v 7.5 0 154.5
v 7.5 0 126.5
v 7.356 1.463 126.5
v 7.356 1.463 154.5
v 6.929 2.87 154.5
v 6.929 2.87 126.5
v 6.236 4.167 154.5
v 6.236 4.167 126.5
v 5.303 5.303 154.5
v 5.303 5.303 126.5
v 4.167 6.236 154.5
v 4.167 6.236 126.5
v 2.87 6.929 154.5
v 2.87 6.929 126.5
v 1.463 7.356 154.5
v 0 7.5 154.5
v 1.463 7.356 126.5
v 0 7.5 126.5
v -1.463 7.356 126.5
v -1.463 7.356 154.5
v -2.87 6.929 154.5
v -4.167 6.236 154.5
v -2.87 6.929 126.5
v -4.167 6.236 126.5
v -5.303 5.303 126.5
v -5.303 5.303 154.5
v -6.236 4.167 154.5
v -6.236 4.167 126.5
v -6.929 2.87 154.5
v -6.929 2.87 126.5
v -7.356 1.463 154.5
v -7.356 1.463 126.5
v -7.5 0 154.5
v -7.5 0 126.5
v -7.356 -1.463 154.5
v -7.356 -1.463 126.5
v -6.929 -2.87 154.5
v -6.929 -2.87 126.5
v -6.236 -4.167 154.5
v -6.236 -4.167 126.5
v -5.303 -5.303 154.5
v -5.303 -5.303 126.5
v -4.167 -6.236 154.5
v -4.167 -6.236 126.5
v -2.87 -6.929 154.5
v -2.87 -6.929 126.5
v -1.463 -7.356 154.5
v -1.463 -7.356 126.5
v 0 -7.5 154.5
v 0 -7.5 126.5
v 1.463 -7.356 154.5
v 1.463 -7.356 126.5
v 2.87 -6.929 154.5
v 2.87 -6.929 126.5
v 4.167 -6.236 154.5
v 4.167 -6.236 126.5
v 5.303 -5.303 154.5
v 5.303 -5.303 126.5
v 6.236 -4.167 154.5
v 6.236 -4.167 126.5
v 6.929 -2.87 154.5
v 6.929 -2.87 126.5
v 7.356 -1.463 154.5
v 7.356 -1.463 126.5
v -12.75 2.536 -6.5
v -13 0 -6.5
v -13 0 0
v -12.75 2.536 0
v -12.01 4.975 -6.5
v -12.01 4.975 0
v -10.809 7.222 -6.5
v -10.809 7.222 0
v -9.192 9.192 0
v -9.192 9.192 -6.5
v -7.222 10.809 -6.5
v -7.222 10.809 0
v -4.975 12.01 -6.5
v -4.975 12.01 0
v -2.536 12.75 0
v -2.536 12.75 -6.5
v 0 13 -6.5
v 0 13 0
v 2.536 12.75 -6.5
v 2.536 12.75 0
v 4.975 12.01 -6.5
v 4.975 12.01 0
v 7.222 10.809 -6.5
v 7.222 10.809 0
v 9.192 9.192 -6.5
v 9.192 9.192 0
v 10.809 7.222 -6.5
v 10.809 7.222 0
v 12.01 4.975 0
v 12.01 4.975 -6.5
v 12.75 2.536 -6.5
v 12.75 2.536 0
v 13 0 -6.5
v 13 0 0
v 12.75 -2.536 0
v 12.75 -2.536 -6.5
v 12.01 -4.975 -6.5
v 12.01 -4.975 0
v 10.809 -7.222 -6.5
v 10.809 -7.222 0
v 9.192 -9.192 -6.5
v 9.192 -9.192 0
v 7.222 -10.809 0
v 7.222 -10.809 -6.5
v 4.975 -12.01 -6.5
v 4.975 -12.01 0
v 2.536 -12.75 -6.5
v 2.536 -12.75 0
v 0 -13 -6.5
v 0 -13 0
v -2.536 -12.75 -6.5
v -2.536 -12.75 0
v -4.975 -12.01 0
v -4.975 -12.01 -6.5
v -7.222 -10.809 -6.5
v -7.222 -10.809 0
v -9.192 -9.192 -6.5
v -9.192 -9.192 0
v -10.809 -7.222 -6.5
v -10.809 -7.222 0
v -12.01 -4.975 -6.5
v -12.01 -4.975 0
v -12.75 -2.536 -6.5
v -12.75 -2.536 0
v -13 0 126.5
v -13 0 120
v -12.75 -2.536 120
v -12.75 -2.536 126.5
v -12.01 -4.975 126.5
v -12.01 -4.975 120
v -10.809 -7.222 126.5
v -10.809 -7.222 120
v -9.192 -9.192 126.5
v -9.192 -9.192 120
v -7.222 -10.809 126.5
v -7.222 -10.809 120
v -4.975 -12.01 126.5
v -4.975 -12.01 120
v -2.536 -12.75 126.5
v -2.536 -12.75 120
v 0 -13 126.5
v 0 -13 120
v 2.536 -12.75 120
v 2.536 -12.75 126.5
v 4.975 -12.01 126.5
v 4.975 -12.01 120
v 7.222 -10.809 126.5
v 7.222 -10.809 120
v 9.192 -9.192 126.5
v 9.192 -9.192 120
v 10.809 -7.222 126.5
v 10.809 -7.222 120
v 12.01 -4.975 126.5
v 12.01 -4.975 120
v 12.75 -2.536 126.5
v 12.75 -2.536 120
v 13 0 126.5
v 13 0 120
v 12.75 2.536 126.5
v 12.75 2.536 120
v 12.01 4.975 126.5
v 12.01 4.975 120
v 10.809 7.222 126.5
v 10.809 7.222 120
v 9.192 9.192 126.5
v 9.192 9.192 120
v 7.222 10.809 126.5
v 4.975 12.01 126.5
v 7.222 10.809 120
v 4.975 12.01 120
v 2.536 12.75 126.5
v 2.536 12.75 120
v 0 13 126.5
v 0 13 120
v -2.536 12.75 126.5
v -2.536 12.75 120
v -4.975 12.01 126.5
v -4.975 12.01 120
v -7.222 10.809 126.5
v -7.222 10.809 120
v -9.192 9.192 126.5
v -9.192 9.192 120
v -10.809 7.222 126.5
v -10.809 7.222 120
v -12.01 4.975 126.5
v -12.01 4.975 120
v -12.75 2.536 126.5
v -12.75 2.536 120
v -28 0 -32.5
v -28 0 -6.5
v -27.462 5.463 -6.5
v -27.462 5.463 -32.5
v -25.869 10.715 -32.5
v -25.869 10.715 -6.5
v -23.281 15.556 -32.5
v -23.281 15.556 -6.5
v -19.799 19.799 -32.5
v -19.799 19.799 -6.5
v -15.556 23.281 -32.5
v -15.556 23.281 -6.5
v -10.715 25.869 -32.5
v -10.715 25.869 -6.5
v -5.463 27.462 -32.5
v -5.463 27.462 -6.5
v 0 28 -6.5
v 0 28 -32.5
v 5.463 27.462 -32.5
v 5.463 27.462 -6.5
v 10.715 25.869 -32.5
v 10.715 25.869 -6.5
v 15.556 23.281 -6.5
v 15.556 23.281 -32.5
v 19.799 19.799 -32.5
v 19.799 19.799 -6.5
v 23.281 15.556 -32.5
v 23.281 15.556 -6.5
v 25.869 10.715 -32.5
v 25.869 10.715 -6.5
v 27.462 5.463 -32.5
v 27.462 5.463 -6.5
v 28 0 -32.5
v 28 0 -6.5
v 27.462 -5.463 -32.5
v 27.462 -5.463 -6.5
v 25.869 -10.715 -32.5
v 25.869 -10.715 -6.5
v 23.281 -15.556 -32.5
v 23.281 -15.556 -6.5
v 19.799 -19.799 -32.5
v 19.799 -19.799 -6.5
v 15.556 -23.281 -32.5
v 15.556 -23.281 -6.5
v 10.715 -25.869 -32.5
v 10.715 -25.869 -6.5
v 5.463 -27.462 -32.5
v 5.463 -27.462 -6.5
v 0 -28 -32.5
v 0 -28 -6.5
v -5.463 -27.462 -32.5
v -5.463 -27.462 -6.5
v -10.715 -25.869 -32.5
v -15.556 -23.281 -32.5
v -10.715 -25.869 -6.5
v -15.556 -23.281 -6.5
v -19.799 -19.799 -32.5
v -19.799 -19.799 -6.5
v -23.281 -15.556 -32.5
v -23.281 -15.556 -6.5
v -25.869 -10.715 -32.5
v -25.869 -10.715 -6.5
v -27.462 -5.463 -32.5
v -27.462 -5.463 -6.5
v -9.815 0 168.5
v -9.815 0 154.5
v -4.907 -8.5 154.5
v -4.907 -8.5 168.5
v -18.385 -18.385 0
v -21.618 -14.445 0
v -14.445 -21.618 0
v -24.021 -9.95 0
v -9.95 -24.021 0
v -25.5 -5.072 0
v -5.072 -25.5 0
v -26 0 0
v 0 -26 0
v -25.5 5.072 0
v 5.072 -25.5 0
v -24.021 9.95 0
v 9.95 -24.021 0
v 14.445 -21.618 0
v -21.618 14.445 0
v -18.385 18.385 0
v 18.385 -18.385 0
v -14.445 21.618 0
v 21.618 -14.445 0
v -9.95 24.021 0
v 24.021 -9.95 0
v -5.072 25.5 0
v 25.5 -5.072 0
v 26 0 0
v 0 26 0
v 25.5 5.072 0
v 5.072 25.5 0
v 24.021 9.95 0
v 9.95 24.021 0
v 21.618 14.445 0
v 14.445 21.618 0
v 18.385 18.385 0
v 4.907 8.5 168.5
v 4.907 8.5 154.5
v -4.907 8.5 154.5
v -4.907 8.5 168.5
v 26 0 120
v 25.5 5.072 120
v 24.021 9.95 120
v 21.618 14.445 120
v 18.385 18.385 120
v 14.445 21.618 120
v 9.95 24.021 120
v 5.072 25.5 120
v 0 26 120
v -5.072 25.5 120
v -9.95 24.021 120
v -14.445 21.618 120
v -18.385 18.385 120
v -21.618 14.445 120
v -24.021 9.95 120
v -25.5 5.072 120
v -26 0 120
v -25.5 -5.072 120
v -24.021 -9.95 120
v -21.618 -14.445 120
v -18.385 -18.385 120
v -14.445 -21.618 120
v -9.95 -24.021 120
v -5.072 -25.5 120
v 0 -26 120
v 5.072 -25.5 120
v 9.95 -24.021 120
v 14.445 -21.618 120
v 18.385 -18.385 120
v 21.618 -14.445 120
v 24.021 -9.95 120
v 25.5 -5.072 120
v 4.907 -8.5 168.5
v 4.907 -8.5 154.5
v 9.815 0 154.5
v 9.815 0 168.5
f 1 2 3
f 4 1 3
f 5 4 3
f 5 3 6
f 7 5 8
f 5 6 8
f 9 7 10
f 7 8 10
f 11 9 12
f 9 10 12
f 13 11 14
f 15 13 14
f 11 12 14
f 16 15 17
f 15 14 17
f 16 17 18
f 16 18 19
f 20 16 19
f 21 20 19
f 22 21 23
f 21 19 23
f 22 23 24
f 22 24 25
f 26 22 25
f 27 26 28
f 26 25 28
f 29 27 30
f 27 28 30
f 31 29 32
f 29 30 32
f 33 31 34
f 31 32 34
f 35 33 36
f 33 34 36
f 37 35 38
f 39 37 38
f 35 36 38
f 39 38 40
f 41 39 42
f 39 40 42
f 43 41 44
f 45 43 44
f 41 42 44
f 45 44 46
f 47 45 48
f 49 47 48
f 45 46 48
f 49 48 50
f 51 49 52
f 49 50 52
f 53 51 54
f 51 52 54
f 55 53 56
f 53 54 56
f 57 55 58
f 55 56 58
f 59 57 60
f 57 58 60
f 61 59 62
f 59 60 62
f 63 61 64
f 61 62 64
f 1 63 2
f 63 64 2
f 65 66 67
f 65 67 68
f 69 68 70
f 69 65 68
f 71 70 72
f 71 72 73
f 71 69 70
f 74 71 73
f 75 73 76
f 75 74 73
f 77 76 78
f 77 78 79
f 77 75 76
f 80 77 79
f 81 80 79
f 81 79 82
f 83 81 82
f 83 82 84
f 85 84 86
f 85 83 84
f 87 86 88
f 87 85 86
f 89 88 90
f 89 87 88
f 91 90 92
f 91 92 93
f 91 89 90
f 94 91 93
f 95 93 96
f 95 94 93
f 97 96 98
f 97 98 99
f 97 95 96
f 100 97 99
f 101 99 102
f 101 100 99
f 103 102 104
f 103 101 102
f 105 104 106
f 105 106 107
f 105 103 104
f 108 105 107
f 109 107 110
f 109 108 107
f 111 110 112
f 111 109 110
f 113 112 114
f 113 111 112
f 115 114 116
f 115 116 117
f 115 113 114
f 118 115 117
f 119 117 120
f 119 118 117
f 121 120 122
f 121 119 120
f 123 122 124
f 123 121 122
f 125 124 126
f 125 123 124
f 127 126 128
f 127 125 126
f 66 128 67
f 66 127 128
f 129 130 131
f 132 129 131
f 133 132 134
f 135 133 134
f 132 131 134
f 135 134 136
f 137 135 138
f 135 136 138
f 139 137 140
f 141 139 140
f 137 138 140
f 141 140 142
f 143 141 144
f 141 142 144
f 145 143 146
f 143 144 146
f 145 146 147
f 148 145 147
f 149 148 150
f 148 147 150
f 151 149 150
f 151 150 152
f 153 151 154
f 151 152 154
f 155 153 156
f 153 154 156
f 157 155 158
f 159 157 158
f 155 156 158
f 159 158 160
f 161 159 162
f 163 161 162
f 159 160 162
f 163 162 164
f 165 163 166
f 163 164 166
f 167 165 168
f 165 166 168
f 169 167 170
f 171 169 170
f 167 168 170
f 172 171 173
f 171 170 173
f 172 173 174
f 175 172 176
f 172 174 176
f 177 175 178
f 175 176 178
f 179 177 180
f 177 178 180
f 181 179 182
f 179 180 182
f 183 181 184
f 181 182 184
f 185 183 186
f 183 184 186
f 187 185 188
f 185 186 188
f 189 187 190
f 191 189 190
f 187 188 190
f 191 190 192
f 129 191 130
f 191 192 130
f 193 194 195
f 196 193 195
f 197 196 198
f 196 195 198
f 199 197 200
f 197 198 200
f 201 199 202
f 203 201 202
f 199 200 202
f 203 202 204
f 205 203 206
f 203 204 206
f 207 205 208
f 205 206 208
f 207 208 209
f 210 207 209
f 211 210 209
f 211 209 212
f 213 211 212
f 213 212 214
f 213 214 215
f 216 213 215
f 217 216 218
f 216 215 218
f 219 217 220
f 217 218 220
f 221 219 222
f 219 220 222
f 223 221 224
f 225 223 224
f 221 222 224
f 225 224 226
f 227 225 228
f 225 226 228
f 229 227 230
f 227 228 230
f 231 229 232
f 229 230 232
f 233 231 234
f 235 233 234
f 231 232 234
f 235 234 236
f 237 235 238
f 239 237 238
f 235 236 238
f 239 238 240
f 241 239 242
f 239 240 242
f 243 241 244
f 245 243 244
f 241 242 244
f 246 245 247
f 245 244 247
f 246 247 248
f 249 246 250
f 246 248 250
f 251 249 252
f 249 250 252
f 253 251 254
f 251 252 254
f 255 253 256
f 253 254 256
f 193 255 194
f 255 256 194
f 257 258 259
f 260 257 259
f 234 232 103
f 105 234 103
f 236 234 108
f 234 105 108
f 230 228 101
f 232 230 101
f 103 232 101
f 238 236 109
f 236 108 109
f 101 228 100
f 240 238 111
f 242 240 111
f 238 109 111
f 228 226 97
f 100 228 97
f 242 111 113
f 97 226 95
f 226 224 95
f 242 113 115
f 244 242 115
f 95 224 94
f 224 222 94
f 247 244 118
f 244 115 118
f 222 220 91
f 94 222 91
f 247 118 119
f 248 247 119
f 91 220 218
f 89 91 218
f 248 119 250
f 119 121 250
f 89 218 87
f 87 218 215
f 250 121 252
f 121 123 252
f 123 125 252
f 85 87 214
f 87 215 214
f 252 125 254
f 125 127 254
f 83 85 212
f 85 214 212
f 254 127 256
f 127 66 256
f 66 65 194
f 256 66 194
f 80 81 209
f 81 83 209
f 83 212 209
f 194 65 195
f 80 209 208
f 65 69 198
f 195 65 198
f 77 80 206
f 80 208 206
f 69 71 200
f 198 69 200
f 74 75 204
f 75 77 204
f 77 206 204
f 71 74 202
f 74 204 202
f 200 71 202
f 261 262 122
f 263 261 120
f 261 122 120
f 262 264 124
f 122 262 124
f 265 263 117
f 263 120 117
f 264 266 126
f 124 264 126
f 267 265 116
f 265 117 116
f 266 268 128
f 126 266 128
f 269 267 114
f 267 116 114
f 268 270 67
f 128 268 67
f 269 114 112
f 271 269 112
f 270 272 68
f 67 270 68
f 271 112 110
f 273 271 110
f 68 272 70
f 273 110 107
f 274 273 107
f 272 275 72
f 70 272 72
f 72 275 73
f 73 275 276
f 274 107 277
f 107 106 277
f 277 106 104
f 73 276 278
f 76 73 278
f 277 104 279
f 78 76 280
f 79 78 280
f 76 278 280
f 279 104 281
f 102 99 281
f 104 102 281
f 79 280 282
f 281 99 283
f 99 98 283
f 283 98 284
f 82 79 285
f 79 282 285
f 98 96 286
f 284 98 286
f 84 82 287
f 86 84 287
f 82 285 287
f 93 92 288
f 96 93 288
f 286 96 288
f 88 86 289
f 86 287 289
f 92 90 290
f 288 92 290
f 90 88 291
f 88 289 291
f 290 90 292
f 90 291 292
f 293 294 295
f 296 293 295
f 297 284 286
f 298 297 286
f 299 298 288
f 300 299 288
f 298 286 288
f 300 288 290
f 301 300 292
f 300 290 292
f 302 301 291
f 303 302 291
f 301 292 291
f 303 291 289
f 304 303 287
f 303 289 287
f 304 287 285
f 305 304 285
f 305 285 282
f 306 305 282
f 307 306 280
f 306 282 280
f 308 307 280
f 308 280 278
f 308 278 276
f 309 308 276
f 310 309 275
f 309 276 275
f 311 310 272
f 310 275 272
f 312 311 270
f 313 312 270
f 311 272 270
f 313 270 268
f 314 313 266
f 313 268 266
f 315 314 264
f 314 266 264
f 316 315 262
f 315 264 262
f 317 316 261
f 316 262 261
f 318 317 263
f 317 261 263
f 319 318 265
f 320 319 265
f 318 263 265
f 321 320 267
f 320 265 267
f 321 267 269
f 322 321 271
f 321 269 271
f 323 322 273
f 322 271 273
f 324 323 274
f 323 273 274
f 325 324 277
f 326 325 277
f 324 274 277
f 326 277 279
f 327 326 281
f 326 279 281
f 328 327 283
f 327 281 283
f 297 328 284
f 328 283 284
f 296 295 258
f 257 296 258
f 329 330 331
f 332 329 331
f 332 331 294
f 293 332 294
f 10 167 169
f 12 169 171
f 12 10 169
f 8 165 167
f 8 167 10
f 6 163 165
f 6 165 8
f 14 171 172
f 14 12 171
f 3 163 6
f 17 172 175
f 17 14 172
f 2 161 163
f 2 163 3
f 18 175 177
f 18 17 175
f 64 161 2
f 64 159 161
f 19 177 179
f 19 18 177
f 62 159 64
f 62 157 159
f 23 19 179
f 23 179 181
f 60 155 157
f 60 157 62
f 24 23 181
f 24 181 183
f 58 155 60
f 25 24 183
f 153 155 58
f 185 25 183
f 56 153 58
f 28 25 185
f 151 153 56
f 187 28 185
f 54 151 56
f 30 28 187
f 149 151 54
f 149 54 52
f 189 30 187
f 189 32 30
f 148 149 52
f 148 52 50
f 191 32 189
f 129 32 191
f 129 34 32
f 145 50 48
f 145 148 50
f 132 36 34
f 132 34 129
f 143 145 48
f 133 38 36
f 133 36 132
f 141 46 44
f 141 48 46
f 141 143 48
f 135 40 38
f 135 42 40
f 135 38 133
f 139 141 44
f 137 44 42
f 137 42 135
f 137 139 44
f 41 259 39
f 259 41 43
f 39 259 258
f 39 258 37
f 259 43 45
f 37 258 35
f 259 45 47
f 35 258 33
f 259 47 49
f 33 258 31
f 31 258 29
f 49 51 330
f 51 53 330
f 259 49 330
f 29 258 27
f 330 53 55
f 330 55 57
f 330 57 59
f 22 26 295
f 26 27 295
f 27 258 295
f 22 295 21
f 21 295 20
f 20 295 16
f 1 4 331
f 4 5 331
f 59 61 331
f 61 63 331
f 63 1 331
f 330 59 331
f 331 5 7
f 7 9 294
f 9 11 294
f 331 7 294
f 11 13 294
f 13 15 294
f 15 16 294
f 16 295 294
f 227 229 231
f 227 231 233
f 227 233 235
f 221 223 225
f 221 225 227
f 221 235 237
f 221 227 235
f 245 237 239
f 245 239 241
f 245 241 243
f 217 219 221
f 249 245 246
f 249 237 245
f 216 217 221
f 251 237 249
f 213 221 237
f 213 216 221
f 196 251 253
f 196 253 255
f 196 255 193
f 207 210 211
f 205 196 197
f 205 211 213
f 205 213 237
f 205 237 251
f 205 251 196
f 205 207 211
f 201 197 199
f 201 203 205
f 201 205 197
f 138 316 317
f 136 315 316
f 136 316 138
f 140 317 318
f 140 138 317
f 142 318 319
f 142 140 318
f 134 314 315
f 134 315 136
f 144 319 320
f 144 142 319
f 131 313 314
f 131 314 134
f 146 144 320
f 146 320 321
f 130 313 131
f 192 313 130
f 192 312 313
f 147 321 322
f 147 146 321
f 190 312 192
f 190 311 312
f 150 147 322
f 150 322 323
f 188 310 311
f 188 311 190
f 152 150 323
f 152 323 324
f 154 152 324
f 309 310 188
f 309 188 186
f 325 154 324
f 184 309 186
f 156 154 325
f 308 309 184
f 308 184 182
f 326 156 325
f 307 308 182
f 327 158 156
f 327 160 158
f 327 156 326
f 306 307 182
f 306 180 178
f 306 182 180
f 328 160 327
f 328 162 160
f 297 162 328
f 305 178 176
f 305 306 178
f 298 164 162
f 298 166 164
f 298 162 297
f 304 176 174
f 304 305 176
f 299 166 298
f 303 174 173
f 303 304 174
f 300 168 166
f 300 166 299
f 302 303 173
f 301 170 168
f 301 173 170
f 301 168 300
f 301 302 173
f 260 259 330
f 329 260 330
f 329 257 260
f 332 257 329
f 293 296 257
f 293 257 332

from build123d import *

# Parameters (mm, degrees)
ESQUISSE1_R        = 26
BOSS_EXTRU_1_DEPTH = 120
ESQUISSE2_R        = 13
BOSS_EXTRU_2_DEPTH = 6.5
BOSS_EXTRU_3_START = 6.5
ESQUISSE3_R        = 13
BOSS_EXTRU_3_DEPTH = 6.5
ESQUISSE4_R        = 7.5
BOSS_EXTRU_4_DEPTH = 28
BOSS_EXTRU_5_DEPTH = 14
ESQUISSE6_R        = 28
BOSS_EXTRU_6_DEPTH = 26


with BuildPart() as part:
    # Esquisse1 → Boss.-Extru.1 (new body)
    with BuildSketch(Plane.XY):
        Circle(ESQUISSE1_R)
    extrude(amount=BOSS_EXTRU_1_DEPTH)

    # Esquisse2 → Boss.-Extru.2 (add)
    with BuildSketch(Plane.XY.offset(120)):
        with Locations(Location((0, 0, 0), (0, 0, 180))):
            Circle(ESQUISSE2_R)
    extrude(amount=BOSS_EXTRU_2_DEPTH)

    # Esquisse3 → Boss.-Extru.3 (add)
    with BuildSketch(Plane(origin=(0, 0, 0), x_dir=(-1, 0, 0), z_dir=(0, 0, -1)).offset(BOSS_EXTRU_3_START)):
        Circle(ESQUISSE3_R)
    extrude(amount=-BOSS_EXTRU_3_DEPTH)

    # Esquisse4 → Boss.-Extru.4 (add)
    with BuildSketch(Plane.XY.offset(126.5)):
        Circle(ESQUISSE4_R)
    extrude(amount=BOSS_EXTRU_4_DEPTH)

    # Esquisse5 → Boss.-Extru.5 (add)
    with BuildSketch(Plane.XY.offset(154.5)):
        Polygon((9.814954576, 0), (4.907477288, 8.5), (-4.907477288, 8.5), (-9.814954576, 0), (-4.907477288, -8.5), (4.907477288, -8.5), align=None)
    extrude(amount=BOSS_EXTRU_5_DEPTH)

    # Esquisse6 → Boss.-Extru.6 (add)
    with BuildSketch(Plane(origin=(0, 0, -6.5), x_dir=(-1, 0, 0), z_dir=(0, 0, -1))):
        Circle(ESQUISSE6_R)
    extrude(amount=BOSS_EXTRU_6_DEPTH)


solid = part.part
